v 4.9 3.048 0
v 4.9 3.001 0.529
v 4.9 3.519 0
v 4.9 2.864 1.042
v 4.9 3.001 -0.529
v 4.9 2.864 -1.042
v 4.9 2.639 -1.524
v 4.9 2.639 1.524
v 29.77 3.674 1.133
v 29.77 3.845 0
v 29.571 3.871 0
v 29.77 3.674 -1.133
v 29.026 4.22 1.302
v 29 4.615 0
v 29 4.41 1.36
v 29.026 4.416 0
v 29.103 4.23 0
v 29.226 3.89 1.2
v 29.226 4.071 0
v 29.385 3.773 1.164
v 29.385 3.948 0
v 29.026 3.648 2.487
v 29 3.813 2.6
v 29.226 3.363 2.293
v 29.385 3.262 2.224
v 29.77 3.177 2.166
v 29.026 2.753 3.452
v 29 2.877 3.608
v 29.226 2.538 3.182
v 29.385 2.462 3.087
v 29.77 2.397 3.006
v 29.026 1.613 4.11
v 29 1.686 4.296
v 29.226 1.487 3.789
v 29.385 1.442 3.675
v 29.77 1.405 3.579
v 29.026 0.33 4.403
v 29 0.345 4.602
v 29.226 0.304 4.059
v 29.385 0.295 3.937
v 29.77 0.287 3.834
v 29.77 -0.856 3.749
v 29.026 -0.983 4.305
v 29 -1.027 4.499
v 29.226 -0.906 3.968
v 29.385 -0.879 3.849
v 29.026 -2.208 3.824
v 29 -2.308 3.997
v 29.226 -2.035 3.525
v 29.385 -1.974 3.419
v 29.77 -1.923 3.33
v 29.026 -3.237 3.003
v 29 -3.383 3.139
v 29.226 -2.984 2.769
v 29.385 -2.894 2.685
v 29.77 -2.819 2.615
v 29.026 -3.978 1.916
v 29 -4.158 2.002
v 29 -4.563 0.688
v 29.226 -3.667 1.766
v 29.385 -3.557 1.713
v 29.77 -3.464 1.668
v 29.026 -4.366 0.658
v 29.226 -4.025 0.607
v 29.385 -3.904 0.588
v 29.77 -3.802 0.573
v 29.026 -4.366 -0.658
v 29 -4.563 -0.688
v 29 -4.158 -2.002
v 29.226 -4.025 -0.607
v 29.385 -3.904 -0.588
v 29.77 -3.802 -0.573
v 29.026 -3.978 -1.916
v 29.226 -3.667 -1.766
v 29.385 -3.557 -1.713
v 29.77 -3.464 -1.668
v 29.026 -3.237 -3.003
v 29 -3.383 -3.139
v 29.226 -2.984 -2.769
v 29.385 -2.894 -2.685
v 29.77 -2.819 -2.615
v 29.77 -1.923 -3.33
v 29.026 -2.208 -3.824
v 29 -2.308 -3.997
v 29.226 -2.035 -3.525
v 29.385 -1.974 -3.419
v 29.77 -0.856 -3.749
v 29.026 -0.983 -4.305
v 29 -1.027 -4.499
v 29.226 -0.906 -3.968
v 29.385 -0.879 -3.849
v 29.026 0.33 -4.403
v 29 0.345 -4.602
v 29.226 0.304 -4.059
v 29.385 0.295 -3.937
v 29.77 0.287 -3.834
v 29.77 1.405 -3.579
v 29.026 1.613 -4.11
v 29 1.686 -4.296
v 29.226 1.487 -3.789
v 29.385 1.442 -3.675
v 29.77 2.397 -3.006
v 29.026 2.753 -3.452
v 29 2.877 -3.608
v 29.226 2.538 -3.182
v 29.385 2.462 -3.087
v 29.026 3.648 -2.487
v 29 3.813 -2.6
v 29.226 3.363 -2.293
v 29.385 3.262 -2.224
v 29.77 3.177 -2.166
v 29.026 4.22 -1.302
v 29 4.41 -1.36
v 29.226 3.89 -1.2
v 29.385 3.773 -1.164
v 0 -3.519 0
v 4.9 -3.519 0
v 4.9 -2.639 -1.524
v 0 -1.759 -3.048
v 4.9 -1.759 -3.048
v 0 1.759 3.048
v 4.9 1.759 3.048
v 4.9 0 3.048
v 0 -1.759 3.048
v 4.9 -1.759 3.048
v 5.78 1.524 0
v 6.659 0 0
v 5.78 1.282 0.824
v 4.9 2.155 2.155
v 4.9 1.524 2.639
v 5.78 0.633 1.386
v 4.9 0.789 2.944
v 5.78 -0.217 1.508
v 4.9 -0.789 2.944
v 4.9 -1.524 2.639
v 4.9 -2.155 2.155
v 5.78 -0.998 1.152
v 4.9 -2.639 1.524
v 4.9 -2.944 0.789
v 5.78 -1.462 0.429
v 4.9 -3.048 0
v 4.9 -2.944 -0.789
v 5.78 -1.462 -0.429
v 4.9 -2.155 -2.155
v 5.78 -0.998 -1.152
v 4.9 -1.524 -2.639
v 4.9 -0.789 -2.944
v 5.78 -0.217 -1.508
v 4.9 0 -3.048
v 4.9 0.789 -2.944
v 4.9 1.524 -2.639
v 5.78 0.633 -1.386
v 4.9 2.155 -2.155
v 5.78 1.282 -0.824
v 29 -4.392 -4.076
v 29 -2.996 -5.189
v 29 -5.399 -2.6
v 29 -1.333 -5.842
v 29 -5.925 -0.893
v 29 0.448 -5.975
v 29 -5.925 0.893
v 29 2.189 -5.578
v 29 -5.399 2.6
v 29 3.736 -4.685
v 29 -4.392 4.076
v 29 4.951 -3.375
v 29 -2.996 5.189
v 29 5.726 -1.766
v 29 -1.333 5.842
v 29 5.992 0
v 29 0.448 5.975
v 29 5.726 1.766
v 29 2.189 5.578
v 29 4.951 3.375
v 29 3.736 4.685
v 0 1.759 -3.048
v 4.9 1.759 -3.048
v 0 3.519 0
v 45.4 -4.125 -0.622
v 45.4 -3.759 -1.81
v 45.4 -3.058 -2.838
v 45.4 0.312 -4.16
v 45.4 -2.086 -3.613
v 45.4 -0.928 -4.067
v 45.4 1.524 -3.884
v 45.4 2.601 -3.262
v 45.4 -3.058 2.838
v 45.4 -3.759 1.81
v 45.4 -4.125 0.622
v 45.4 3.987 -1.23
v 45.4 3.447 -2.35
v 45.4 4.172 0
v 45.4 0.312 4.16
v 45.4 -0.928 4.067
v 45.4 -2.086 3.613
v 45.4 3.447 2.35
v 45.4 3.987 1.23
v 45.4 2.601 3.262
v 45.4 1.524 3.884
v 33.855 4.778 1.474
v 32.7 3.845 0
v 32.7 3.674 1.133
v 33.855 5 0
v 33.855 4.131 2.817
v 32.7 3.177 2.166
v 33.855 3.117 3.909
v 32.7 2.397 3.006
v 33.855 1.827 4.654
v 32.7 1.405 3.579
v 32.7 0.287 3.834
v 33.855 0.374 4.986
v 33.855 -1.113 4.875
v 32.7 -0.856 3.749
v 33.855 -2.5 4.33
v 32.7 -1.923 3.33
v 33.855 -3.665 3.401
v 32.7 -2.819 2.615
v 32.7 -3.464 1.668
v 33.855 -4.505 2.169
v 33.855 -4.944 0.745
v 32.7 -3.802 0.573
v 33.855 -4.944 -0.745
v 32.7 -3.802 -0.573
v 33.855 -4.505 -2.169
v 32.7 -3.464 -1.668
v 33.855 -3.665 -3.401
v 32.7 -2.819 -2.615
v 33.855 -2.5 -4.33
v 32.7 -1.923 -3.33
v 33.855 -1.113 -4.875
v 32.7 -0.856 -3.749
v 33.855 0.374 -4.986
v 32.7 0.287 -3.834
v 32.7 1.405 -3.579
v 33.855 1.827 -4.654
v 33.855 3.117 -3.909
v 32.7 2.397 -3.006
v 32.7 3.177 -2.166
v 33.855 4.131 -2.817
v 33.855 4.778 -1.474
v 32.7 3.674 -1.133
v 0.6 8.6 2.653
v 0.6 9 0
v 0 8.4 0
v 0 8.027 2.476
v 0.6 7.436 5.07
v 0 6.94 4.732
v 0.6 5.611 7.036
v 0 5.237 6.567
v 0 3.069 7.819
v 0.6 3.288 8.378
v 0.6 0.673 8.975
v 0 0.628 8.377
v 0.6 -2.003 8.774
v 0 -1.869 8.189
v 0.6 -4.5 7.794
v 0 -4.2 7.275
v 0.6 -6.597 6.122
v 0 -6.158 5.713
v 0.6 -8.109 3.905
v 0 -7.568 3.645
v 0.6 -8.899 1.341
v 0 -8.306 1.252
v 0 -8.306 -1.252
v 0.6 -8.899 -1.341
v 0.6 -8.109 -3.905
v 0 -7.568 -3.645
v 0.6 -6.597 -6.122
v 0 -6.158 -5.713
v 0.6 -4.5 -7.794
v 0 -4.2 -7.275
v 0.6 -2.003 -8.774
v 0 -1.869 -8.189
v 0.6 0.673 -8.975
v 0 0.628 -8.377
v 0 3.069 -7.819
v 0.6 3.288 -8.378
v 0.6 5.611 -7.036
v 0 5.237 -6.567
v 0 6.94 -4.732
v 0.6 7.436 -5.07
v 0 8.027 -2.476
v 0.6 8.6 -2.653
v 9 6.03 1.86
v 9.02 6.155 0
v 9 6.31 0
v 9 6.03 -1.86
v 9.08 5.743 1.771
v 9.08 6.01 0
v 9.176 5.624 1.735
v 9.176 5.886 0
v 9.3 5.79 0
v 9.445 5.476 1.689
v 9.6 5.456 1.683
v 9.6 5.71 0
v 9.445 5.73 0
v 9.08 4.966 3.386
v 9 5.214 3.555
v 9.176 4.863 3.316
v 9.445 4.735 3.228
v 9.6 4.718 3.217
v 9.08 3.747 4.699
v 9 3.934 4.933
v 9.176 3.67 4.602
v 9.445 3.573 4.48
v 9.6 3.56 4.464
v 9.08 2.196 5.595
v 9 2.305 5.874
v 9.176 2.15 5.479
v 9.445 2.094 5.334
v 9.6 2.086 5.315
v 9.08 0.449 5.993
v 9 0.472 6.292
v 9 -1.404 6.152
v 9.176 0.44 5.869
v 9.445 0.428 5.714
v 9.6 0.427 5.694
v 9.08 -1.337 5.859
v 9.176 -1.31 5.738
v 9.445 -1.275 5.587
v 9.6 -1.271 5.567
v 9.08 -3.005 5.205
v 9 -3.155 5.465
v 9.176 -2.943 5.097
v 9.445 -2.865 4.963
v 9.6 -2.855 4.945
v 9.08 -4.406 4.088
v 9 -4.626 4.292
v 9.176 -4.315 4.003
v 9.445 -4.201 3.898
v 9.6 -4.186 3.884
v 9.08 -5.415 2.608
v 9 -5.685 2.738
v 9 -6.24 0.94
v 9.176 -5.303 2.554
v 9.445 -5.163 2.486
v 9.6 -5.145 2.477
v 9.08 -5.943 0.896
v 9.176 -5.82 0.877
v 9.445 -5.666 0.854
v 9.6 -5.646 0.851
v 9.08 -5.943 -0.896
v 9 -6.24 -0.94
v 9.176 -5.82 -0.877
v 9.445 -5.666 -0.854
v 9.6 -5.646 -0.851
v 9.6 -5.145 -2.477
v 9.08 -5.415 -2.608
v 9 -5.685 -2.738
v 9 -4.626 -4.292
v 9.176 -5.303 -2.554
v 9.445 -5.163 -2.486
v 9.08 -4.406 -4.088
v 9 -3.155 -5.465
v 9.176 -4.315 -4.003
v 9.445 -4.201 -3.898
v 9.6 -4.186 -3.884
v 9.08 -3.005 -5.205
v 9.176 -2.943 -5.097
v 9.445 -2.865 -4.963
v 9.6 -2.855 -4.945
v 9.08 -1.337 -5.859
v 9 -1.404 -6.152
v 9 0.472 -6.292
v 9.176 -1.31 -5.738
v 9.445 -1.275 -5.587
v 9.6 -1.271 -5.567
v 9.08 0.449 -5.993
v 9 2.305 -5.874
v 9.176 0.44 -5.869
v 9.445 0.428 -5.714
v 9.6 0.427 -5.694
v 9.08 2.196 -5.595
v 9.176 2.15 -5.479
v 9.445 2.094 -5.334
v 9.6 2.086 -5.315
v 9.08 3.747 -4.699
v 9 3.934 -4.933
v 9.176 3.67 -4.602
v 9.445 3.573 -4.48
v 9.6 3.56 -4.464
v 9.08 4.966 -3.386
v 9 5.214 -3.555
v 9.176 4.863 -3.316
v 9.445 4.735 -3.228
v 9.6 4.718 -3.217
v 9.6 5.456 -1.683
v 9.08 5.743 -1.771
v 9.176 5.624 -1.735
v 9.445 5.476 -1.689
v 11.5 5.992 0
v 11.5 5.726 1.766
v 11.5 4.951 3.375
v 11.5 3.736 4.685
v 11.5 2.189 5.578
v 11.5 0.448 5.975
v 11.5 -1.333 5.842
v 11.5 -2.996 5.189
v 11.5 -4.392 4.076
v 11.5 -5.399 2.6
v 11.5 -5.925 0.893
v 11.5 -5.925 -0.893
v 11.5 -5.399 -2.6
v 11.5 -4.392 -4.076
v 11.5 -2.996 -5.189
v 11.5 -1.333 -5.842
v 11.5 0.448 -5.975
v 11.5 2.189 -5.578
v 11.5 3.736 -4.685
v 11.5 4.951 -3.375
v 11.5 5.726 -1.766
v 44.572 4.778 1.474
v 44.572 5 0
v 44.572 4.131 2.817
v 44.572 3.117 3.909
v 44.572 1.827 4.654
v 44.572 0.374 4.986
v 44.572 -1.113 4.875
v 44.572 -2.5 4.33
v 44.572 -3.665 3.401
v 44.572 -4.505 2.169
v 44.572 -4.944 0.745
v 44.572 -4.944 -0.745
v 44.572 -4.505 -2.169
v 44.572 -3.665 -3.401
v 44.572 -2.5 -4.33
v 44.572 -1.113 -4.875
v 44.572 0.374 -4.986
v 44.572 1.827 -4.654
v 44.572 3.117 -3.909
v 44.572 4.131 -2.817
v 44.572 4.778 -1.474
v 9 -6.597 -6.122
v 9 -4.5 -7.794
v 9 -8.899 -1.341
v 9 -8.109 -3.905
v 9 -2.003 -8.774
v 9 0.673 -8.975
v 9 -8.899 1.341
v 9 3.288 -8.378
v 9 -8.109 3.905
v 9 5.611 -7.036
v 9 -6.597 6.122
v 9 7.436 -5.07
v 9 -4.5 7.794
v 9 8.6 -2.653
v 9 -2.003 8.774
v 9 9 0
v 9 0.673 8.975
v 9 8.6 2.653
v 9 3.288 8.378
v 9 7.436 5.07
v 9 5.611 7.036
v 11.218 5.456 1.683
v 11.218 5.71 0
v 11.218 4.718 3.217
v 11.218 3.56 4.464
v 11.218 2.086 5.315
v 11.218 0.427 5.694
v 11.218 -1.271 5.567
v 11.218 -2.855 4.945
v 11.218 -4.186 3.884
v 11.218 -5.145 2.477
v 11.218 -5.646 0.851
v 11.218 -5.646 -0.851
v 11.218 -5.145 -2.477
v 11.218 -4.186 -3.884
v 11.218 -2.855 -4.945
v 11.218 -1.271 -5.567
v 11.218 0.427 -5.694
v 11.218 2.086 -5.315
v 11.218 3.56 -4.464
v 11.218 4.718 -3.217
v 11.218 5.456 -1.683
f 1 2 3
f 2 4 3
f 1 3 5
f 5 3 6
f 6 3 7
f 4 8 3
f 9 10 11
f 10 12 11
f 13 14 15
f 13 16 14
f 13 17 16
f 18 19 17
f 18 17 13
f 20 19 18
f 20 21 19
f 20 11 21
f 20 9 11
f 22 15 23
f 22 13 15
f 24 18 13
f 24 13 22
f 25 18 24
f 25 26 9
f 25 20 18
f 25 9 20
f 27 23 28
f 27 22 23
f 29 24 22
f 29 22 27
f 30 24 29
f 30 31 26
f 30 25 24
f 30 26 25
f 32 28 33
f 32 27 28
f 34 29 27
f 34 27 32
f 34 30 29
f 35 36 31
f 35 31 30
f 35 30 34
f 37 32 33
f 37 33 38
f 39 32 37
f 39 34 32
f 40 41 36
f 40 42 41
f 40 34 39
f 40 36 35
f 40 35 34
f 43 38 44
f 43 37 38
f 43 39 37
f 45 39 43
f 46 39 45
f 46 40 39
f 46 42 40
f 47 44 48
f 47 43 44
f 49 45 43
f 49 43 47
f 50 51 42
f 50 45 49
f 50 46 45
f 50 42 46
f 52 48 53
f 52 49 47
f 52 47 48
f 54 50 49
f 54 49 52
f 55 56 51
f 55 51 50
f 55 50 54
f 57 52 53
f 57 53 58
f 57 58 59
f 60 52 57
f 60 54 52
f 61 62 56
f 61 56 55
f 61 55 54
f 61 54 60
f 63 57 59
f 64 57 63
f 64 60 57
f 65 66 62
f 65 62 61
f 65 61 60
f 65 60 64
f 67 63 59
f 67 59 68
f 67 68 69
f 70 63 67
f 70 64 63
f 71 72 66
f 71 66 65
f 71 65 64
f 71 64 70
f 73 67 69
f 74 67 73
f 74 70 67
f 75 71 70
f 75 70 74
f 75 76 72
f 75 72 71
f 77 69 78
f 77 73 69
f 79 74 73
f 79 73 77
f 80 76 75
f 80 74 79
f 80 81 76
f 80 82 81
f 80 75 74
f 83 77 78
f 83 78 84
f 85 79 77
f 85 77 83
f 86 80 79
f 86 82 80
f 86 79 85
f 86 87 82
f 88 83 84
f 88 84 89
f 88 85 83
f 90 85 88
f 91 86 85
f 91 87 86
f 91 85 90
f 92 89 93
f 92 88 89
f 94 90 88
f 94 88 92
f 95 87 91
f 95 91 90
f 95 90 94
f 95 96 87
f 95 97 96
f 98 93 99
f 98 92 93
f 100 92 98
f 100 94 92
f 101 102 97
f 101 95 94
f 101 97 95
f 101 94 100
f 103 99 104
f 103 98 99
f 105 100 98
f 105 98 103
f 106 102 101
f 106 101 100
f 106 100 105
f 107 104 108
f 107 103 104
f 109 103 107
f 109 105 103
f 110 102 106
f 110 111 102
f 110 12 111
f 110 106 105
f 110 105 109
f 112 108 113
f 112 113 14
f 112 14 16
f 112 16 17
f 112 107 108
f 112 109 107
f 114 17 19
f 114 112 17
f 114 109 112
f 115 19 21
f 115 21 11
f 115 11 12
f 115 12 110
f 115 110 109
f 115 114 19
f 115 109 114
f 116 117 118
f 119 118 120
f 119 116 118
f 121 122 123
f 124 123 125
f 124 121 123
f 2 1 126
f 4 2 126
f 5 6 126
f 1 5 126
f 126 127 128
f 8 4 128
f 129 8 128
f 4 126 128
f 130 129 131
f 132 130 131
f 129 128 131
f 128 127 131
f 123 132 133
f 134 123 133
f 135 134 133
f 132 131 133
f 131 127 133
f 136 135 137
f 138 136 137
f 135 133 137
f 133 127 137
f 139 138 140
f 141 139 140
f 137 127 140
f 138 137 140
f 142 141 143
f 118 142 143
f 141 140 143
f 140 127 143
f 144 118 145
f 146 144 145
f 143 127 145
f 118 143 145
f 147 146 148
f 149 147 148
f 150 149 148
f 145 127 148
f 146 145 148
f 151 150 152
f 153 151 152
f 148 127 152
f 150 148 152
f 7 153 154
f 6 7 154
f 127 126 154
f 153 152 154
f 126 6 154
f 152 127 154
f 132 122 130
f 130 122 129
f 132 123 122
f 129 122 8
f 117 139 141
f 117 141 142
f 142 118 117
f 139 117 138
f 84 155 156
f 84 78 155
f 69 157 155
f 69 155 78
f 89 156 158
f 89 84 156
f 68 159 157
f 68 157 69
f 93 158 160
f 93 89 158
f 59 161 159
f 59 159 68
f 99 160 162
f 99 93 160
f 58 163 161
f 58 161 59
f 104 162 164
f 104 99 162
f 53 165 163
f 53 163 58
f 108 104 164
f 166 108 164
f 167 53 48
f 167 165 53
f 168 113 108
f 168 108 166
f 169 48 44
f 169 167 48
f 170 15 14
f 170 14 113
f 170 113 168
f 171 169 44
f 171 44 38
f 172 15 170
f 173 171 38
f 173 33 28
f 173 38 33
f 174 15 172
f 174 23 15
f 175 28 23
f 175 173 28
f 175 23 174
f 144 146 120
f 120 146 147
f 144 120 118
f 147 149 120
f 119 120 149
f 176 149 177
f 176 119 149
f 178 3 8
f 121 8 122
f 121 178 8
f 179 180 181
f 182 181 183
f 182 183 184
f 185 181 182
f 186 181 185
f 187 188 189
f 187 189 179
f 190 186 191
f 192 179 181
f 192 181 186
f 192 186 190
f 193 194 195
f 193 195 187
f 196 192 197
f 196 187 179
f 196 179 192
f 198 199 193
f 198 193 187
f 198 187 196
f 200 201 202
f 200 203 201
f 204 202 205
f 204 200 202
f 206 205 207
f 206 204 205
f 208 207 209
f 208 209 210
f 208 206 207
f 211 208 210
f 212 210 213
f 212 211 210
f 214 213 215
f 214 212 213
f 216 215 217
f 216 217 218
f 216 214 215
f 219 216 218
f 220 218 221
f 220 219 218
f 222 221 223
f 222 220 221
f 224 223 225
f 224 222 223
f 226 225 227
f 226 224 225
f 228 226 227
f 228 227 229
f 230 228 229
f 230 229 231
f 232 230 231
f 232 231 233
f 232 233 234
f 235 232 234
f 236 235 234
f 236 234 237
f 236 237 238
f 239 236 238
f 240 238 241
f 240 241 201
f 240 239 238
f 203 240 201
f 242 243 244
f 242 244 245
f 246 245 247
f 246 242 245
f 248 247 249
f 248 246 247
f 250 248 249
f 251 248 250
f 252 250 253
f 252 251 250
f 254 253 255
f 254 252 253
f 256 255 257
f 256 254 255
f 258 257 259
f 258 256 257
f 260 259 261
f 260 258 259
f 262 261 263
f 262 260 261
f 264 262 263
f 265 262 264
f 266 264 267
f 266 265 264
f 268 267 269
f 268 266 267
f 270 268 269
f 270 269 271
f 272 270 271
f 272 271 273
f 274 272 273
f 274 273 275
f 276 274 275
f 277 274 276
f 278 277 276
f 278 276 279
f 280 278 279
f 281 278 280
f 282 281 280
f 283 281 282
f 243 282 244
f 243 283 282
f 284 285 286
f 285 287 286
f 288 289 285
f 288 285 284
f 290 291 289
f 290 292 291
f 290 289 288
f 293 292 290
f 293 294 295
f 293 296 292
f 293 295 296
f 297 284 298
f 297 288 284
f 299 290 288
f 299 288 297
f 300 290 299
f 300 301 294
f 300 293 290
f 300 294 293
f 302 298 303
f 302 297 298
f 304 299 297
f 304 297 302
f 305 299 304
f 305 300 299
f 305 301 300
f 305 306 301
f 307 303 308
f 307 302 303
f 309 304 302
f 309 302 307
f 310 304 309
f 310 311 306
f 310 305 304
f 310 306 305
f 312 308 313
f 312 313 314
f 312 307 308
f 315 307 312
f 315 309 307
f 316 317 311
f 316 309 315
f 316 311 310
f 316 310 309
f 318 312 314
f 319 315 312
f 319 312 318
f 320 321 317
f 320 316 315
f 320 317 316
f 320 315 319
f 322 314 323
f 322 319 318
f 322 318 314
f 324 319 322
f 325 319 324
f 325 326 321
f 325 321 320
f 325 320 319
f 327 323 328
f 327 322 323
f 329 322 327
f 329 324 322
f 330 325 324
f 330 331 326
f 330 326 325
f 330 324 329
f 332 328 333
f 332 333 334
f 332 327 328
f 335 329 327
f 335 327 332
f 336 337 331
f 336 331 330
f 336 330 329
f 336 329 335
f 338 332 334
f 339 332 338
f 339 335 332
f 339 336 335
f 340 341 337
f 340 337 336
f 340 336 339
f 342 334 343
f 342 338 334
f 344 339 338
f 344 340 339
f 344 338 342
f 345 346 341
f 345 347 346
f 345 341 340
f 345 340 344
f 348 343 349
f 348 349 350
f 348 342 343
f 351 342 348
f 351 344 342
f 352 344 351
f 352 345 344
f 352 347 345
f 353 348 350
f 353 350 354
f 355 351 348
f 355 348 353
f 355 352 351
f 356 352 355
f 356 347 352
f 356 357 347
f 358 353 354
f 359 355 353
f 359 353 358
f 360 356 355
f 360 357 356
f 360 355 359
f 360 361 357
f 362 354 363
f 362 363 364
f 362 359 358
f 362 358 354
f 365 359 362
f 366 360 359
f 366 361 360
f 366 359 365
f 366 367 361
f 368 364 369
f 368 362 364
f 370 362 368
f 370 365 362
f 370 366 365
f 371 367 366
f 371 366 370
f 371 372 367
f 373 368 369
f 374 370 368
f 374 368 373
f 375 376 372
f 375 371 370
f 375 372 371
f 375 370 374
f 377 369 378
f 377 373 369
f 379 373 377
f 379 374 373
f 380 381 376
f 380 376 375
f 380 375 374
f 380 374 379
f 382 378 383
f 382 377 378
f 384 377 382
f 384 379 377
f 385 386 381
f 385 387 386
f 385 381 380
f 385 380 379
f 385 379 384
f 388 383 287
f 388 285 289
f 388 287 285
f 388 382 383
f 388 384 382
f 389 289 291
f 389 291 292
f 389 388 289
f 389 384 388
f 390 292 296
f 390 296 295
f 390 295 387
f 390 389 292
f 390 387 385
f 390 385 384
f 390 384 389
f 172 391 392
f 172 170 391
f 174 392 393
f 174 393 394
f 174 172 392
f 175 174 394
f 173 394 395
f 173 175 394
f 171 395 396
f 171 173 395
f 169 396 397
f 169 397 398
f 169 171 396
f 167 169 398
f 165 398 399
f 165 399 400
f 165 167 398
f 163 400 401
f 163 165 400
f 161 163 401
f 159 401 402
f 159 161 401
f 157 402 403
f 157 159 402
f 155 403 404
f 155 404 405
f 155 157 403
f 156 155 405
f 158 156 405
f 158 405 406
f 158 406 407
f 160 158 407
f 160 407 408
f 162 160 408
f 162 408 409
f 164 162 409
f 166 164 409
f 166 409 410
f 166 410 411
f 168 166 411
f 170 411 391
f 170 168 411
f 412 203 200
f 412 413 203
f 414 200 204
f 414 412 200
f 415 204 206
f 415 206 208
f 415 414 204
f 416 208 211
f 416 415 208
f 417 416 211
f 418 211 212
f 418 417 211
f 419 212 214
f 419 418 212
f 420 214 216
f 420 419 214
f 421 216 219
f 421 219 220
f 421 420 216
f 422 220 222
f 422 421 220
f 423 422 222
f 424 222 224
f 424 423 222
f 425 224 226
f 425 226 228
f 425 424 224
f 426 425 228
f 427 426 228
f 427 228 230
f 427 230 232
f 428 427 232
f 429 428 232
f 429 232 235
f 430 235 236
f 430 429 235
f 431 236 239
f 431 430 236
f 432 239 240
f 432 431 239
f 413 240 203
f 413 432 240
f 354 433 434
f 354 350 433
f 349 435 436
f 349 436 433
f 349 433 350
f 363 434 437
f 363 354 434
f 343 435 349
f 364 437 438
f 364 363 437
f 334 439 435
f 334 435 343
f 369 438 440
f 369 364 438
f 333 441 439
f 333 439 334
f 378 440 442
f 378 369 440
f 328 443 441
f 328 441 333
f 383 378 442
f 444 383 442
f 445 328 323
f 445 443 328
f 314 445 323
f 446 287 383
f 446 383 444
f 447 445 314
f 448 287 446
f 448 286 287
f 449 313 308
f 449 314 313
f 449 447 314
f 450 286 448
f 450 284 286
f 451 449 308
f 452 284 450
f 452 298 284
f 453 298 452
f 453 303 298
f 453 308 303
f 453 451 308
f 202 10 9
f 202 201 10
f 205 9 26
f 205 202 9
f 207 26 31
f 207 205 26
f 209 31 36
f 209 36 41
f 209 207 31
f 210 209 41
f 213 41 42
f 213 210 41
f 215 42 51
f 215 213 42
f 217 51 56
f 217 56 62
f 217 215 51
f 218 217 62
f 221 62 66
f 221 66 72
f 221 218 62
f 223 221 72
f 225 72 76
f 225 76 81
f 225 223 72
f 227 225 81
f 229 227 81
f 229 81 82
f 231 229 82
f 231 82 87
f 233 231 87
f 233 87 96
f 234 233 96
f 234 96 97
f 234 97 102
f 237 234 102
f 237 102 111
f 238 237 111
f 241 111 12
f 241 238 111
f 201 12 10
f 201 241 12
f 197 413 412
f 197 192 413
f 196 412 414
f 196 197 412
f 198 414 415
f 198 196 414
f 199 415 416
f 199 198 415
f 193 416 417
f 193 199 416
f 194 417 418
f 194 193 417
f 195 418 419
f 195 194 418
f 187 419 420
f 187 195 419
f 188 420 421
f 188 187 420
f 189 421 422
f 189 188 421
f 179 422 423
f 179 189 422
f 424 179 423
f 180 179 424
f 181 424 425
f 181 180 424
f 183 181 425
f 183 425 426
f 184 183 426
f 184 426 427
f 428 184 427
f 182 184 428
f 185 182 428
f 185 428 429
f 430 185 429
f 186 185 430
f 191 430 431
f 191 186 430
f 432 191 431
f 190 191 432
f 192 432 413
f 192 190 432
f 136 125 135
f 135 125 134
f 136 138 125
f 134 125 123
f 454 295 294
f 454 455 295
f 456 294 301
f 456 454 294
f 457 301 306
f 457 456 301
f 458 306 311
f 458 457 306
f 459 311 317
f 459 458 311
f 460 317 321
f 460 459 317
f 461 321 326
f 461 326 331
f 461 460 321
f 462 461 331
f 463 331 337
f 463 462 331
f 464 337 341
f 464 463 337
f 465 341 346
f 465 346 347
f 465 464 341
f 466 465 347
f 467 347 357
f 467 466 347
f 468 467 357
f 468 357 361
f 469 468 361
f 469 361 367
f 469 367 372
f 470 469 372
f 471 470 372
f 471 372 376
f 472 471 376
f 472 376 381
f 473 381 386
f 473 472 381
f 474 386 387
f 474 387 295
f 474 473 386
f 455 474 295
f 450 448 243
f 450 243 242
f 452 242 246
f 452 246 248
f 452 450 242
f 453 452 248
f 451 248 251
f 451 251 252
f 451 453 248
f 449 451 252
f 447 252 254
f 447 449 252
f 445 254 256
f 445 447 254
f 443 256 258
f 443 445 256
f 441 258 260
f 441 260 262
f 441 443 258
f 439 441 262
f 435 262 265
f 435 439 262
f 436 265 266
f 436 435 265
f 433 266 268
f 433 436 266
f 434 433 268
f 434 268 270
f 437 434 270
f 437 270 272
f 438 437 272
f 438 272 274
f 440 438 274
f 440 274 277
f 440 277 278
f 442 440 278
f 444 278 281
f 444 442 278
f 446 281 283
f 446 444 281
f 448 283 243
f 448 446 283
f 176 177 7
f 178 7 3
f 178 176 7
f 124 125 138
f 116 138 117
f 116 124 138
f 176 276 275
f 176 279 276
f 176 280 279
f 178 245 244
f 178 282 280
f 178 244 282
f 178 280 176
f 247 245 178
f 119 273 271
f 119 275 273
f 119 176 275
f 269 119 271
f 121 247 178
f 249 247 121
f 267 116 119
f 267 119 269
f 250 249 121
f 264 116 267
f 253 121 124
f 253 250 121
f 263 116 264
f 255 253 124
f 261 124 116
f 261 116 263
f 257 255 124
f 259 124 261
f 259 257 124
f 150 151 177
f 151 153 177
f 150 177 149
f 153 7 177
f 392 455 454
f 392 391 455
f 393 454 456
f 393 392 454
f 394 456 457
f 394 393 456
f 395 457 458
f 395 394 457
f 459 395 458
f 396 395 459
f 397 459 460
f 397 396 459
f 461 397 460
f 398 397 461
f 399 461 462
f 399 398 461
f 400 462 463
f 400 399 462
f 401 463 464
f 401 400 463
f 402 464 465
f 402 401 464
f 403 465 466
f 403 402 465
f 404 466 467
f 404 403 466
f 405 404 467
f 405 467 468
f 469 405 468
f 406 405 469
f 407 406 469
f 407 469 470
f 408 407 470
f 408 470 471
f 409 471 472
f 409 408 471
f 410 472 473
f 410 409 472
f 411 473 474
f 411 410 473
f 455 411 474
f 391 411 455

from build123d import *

# Parameters (mm, degrees)
CHAMFER1_SIZE = 0.6
HEX_2_DEPTH   = 4.9


with BuildPart() as part:
    # BodySke → BaseBody (revolve)
    with BuildSketch(Plane.XY):
        with BuildLine():
            Line((0, 0), (0, 9))
            Line((0, 9), (9, 9))
            Line((9, 9), (9, 6.31))
            ThreePointArc((9, 6.31), (9.175735931, 5.885735931), (9.6, 5.71))
            Line((9.6, 5.71), (11.218, 5.71))
            Line((11.218, 5.71), (11.5, 5.992))
            Line((11.5, 5.992), (29, 5.992))
            Line((29, 5.992), (29, 4.615))
            ThreePointArc((29, 4.615), (29.225527778, 4.070527778), (29.77, 3.845))
            Line((29.77, 3.845), (32.7, 3.845))
            Line((32.7, 3.845), (33.855, 5))
            Line((33.855, 5), (44.572, 5))
            Line((44.572, 5), (45.4, 4.172))
            Line((45.4, 4.172), (45.4, 0))
            Line((45.4, 0), (0, 0))
        make_face()
    revolve(axis=Axis((-6.35, 0, 0), (1, 0, 0)))

    # Chamfer1
    chamfer1_edges = [part.edges().sort_by_distance(p)[0] for p in [
        (0, -9, 0),
    ]]
    chamfer(chamfer1_edges, length=CHAMFER1_SIZE)

    # Sketch2 → PreBroach (revolve, cut)
    with BuildSketch(Plane.XY):
        Polygon((0, 3.0475), (4.9, 3.0475), (6.659474945, 0), (0, 0), align=None)
    revolve(axis=Axis((0, 0, 0), (1, 0, 0)), mode=Mode.SUBTRACT)

    # Sketch3 → Hex 2 (cut)
    with BuildSketch(Plane.ZY):
        Polygon((-3.0475, -1.759474945), (-3.0475, 1.759474945), (0, 3.518949891), (3.0475, 1.759474945), (3.0475, -1.759474945), (0, -3.518949891), align=None)
    extrude(amount=-HEX_2_DEPTH, mode=Mode.SUBTRACT)


solid = part.part
